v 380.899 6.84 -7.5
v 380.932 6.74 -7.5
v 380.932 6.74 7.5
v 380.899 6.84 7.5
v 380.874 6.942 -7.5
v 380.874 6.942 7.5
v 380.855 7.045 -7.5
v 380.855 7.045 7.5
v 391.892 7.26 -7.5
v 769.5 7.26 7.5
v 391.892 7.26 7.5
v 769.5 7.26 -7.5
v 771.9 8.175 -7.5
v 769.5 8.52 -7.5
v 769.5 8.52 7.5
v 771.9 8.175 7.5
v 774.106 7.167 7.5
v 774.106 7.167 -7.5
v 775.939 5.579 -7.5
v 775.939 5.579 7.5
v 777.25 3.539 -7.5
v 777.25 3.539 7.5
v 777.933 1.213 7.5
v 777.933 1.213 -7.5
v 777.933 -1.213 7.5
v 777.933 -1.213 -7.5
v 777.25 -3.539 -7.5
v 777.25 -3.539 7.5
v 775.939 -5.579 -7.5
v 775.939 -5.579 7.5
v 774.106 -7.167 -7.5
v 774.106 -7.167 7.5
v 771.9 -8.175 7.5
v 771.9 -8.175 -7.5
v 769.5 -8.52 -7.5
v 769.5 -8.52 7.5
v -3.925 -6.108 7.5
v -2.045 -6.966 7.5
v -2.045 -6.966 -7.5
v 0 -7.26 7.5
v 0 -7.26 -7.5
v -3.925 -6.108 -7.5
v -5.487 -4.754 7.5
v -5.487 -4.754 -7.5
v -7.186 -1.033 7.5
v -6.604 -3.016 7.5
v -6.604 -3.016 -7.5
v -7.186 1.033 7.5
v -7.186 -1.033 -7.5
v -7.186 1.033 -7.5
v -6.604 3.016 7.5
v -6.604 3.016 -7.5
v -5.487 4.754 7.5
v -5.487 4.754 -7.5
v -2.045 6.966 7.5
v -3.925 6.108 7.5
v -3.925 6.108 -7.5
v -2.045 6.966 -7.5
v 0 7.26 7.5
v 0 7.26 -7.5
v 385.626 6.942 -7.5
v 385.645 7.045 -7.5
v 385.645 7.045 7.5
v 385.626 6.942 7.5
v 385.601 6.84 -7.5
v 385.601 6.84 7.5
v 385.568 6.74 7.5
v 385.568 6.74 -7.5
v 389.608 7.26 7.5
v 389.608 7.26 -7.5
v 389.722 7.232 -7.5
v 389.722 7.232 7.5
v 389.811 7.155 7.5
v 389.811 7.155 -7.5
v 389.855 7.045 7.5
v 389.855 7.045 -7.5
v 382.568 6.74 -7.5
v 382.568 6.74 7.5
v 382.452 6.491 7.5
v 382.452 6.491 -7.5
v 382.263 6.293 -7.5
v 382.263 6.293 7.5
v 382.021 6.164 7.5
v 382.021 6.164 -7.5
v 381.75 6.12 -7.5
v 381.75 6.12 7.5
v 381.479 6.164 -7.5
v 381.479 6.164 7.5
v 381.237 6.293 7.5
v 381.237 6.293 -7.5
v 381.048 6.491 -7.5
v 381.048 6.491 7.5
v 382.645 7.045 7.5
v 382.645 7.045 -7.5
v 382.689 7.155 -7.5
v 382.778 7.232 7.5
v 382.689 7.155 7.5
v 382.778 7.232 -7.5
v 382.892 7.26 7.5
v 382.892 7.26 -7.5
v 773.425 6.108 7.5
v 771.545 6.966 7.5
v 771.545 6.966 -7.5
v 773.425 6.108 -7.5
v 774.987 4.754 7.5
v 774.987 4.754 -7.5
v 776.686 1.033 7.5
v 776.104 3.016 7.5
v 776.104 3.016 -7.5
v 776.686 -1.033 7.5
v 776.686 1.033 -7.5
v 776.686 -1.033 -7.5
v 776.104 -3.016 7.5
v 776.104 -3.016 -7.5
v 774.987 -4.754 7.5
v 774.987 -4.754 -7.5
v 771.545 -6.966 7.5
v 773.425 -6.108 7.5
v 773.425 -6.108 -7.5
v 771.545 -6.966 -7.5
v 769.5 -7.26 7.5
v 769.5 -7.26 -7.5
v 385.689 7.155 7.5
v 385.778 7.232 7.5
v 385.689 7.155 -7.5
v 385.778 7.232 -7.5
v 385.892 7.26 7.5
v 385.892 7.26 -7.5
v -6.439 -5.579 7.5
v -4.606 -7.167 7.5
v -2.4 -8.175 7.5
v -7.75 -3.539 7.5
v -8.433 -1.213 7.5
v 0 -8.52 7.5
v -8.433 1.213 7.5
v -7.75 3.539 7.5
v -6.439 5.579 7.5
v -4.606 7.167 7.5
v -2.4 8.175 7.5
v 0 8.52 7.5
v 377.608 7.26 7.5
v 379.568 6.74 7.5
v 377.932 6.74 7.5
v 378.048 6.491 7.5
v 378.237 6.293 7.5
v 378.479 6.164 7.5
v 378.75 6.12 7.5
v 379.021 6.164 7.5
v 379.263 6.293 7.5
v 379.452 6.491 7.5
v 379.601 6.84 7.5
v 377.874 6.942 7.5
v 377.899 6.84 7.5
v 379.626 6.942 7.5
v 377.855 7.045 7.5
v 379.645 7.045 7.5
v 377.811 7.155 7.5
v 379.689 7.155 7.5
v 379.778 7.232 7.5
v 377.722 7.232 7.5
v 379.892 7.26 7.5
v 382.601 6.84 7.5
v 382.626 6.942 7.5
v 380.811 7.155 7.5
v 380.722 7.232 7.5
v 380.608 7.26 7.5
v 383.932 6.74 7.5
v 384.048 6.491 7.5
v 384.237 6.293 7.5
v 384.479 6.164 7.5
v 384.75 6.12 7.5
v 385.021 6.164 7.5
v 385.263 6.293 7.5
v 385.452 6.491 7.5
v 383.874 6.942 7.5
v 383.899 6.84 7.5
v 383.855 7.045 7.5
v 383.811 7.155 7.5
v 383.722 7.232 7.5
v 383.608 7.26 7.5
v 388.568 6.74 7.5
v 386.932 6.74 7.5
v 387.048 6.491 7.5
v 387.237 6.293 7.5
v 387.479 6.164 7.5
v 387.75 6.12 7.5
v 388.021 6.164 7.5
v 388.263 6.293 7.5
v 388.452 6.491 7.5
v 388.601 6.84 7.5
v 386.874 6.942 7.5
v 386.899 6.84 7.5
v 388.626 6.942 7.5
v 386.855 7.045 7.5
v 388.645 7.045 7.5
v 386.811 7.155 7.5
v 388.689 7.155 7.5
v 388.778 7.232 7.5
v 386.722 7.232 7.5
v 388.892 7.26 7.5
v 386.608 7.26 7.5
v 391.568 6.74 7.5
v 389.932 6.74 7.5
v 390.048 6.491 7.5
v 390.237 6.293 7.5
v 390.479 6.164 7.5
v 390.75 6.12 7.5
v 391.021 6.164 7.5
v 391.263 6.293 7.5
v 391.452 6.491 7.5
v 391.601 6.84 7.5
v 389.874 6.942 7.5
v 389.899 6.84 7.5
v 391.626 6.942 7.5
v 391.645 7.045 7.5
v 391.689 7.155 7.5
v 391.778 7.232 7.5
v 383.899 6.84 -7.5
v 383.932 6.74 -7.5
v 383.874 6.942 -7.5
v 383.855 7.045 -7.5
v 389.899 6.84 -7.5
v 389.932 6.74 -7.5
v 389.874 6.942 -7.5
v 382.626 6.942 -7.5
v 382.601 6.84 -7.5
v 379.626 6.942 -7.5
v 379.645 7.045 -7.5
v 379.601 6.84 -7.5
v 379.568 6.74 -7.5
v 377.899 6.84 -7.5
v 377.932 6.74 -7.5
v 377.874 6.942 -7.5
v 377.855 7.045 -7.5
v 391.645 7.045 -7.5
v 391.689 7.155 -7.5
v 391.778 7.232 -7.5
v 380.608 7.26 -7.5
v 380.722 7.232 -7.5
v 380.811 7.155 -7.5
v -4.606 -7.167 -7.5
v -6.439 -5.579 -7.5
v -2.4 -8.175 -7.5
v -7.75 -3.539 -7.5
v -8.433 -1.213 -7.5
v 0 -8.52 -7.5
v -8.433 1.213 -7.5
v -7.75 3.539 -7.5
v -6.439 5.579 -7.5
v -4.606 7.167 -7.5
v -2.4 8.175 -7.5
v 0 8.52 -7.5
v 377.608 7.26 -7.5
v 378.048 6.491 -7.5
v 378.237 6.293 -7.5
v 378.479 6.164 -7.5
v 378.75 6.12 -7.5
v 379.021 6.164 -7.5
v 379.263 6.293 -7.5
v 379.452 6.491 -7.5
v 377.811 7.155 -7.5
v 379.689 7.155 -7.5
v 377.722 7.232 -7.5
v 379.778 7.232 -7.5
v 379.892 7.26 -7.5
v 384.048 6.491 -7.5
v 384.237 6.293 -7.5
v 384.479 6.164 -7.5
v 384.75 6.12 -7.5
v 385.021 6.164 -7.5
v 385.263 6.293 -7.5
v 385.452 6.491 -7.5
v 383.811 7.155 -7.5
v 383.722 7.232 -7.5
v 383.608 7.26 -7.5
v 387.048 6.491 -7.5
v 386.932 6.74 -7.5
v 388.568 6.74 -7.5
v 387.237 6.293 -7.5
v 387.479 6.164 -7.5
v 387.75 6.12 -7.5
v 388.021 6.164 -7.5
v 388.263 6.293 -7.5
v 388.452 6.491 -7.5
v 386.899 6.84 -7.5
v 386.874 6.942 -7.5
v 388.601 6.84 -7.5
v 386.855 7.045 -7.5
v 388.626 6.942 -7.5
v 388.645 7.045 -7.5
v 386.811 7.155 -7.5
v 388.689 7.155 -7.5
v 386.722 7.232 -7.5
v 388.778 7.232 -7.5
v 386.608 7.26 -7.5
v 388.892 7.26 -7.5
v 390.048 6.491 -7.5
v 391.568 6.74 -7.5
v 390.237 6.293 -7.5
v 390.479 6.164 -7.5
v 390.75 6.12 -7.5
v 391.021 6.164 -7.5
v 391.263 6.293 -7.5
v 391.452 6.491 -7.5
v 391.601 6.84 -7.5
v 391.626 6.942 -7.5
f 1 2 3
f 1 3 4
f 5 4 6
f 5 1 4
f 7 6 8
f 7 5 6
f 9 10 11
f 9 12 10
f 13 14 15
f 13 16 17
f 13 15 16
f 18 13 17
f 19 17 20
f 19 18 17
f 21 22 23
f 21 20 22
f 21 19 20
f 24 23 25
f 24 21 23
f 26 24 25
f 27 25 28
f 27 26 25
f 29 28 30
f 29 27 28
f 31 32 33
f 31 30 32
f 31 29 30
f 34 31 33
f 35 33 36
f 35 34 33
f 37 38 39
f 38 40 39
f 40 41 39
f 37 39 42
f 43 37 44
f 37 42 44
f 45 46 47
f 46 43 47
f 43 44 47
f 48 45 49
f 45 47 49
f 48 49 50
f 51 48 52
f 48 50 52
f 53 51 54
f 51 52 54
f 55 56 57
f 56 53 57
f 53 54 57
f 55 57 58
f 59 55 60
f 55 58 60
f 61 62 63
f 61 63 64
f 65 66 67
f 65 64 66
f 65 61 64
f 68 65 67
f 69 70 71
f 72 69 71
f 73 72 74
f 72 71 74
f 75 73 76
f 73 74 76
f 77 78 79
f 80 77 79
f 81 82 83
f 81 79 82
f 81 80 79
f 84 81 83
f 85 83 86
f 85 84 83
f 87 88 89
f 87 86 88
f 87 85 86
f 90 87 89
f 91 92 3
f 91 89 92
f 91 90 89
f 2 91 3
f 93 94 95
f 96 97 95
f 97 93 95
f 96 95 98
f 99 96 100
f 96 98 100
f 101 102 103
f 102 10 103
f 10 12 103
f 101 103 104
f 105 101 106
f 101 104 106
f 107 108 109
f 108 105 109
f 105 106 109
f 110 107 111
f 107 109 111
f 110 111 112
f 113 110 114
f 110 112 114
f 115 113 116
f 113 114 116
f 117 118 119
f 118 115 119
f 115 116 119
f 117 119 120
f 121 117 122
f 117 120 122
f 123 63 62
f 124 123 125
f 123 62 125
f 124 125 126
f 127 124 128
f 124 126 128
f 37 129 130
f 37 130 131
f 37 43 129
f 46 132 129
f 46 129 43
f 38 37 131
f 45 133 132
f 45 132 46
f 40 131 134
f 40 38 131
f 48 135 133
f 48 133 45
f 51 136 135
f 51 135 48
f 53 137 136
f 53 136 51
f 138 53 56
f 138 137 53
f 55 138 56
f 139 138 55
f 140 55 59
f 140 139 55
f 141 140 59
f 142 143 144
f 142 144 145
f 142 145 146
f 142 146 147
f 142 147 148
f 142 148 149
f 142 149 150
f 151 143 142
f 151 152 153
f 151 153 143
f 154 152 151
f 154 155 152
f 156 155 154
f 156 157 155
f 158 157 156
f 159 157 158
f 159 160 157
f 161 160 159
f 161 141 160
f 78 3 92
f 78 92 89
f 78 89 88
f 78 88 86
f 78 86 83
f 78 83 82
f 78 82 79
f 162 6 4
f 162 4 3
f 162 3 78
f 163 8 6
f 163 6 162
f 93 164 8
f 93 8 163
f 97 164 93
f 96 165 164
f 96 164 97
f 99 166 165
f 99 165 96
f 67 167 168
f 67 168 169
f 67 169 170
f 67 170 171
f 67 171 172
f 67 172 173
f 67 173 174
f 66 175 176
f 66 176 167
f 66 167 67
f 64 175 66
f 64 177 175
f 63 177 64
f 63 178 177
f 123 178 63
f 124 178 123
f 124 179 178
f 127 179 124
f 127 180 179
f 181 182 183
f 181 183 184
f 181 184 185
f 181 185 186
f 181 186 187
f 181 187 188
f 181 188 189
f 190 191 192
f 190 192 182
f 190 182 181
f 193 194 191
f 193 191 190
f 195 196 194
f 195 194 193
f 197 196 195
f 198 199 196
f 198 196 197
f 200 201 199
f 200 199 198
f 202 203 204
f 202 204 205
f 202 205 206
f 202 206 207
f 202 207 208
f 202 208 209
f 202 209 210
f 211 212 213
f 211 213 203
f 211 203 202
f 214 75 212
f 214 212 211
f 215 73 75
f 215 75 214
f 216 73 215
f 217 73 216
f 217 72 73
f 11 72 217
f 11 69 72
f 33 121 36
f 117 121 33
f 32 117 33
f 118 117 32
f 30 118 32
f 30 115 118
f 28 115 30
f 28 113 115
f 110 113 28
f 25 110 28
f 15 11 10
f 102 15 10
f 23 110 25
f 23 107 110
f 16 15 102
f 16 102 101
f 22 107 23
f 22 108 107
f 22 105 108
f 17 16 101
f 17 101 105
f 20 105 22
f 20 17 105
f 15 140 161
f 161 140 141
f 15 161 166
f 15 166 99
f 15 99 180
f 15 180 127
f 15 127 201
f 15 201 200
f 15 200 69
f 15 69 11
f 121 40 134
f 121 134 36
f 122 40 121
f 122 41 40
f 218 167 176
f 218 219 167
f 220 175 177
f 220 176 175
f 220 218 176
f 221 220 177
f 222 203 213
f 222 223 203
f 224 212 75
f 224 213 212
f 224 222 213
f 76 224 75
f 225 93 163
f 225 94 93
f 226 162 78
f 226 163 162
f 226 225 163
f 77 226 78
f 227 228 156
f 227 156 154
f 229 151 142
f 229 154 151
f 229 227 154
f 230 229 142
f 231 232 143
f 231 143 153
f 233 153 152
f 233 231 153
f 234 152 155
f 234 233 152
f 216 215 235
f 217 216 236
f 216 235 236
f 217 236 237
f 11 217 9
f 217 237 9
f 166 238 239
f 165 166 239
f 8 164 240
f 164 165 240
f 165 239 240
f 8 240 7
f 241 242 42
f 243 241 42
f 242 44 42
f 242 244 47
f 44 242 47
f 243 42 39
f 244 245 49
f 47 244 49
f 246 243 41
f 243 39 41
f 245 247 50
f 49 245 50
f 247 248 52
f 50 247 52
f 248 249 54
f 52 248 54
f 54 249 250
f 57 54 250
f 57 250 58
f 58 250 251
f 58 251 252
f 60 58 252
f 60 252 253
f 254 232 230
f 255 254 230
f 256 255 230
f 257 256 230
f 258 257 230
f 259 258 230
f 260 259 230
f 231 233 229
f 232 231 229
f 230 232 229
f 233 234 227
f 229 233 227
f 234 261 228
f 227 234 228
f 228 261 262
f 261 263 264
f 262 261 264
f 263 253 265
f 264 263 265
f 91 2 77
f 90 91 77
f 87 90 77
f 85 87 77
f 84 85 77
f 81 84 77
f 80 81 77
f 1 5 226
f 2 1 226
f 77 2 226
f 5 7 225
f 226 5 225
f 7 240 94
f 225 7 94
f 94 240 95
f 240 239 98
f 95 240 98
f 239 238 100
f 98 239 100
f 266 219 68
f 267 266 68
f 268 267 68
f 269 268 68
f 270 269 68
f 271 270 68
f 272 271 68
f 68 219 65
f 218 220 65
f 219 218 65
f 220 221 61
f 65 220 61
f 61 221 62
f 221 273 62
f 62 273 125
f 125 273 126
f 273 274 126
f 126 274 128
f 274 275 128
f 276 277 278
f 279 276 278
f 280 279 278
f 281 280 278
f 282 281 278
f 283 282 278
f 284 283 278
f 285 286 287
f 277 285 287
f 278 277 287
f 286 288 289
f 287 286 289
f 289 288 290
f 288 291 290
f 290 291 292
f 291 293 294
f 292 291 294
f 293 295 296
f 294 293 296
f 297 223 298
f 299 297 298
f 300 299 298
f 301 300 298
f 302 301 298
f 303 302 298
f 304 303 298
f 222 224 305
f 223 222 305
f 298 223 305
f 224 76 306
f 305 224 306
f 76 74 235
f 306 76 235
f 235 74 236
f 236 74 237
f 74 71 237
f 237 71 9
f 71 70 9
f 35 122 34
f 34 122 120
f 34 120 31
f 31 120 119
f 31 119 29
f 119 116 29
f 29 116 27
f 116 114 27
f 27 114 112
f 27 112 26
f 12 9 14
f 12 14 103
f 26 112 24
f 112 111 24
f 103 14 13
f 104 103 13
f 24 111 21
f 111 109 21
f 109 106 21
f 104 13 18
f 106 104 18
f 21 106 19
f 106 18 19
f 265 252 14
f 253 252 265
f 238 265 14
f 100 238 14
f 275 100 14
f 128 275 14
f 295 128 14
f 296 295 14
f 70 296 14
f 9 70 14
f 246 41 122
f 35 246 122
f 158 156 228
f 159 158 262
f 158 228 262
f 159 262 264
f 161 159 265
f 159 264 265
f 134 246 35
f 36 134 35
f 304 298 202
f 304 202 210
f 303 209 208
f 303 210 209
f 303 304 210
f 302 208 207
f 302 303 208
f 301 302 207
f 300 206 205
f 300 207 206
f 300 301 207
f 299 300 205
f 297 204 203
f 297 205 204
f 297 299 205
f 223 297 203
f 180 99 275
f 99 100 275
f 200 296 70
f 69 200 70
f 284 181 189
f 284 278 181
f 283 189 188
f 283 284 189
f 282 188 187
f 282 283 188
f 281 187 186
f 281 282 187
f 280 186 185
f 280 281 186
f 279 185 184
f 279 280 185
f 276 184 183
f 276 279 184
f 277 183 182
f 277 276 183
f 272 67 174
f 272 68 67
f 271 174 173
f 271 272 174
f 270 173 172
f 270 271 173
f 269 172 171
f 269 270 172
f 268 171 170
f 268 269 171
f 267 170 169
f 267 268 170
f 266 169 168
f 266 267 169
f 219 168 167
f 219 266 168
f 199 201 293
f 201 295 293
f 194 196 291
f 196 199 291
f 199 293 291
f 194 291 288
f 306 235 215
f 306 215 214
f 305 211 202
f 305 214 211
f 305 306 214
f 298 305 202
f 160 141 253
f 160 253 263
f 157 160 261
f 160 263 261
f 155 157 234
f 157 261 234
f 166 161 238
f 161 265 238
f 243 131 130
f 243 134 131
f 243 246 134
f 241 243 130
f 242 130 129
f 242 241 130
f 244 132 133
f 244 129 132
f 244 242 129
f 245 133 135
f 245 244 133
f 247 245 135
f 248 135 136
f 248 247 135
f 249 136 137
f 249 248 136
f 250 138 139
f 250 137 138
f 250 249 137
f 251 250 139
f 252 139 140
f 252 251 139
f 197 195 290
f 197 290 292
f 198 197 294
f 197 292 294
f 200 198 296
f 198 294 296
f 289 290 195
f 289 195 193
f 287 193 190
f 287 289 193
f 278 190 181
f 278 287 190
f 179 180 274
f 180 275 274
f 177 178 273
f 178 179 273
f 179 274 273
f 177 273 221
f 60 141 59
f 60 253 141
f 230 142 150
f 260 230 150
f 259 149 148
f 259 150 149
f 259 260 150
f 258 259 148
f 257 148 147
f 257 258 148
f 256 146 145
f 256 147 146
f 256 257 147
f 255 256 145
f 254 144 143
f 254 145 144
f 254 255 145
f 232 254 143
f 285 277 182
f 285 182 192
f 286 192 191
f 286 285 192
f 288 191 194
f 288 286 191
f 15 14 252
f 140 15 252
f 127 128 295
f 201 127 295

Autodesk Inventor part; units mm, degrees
ref_plane "YZ Plane" through (0, 0, 0) normal (1, 0, 0) x (0, 1, 0)
ref_plane "XZ Plane" through (0, 0, 0) normal (0, 1, 0) x (-1, 0, 0)
ref_plane "XY Plane" through (0, 0, 0) normal (0, 0, 1) x (1, 0, 0)
sketch "_____1" plane through (0, 0, 0) normal (0, 0, 1) x (1, 0, 0)
  arc A0 (0, 8.52) -> (0, -8.52) centre (0, 0) ccw
  line L0 (0, -8.52) -> (769.5, -8.52)
  arc A1 (769.5, -8.52) -> (769.5, 8.52) centre (769.5, 0) ccw
  line L1 (769.5, 8.52) -> (0, 8.52)
  arc A2 (0, 7.26) -> (0, -7.26) centre (0, 0) ccw
  line L2 (0, -7.26) -> (769.5, -7.26)
  arc A3 (769.5, -7.26) -> (769.5, 7.26) centre (769.5, 0) ccw
  line L3 (769.5, 7.26) -> (0, 7.26)
extrude "Extrusion1" add sketch "_____1" along normal mid plane 15
sketch "_____2" plane through (0, 0, 0) normal (0, 0, 1) x (1, 0, 0)
  line L0 (377.25, 8.52) -> (377.25, 7.26)
  line L1 (377.25, 7.26) -> (377.6077, 7.26)
  arc A0 (377.8552, 7.0453) -> (377.6077, 7.26) centre (377.6077, 7.01) ccw
  arc A1 (377.8552, 7.0453) -> (377.9317, 6.7401) centre (379.36, 7.26) ccw
  arc A2 (377.9317, 6.7401) -> (379.5683, 6.7401) centre (378.75, 6.97) ccw
  arc A3 (379.5683, 6.7401) -> (379.6448, 7.0453) centre (378.14, 7.26) ccw
  arc A4 (379.8923, 7.26) -> (379.6448, 7.0453) centre (379.8923, 7.01) ccw
  line L2 (379.8923, 7.26) -> (380.6077, 7.26)
  arc A5 (380.8552, 7.0453) -> (380.6077, 7.26) centre (380.6077, 7.01) ccw
  arc A6 (380.8552, 7.0453) -> (380.9317, 6.7401) centre (382.36, 7.26) ccw
  arc A7 (380.9317, 6.7401) -> (382.5683, 6.7401) centre (381.75, 6.97) ccw
  arc A8 (382.5683, 6.7401) -> (382.6448, 7.0453) centre (381.14, 7.26) ccw
  arc A9 (382.8923, 7.26) -> (382.6448, 7.0453) centre (382.8923, 7.01) ccw
  line L3 (382.8923, 7.26) -> (383.6077, 7.26)
  arc A10 (383.8552, 7.0453) -> (383.6077, 7.26) centre (383.6077, 7.01) ccw
  arc A11 (383.8552, 7.0453) -> (383.9317, 6.7401) centre (385.36, 7.26) ccw
  arc A12 (383.9317, 6.7401) -> (385.5683, 6.7401) centre (384.75, 6.97) ccw
  arc A13 (385.5683, 6.7401) -> (385.6448, 7.0453) centre (384.14, 7.26) ccw
  arc A14 (385.8923, 7.26) -> (385.6448, 7.0453) centre (385.8923, 7.01) ccw
  line L4 (385.8923, 7.26) -> (386.6077, 7.26)
  arc A15 (386.8552, 7.0453) -> (386.6077, 7.26) centre (386.6077, 7.01) ccw
  arc A16 (386.8552, 7.0453) -> (386.9317, 6.7401) centre (388.36, 7.26) ccw
  arc A17 (386.9317, 6.7401) -> (388.5683, 6.7401) centre (387.75, 6.97) ccw
  arc A18 (388.5683, 6.7401) -> (388.6448, 7.0453) centre (387.14, 7.26) ccw
  arc A19 (388.8923, 7.26) -> (388.6448, 7.0453) centre (388.8923, 7.01) ccw
  line L5 (388.8923, 7.26) -> (389.6077, 7.26)
  arc A20 (389.8552, 7.0453) -> (389.6077, 7.26) centre (389.6077, 7.01) ccw
  arc A21 (389.8552, 7.0453) -> (389.9317, 6.7401) centre (391.36, 7.26) ccw
  arc A22 (389.9317, 6.7401) -> (391.5683, 6.7401) centre (390.75, 6.97) ccw
  arc A23 (391.5683, 6.7401) -> (391.6448, 7.0453) centre (390.14, 7.26) ccw
  arc A24 (391.8923, 7.26) -> (391.6448, 7.0453) centre (391.8923, 7.01) ccw
  line L6 (391.8923, 7.26) -> (392.25, 7.26)
  line L7 (392.25, 7.26) -> (392.25, 8.52)
  line L8 (392.25, 8.52) -> (377.25, 8.52)
extrude "Extrusion2" add sketch "_____2" along normal mid plane 15
properties part number "GBN1587MR3-150_info-1-16-16"
